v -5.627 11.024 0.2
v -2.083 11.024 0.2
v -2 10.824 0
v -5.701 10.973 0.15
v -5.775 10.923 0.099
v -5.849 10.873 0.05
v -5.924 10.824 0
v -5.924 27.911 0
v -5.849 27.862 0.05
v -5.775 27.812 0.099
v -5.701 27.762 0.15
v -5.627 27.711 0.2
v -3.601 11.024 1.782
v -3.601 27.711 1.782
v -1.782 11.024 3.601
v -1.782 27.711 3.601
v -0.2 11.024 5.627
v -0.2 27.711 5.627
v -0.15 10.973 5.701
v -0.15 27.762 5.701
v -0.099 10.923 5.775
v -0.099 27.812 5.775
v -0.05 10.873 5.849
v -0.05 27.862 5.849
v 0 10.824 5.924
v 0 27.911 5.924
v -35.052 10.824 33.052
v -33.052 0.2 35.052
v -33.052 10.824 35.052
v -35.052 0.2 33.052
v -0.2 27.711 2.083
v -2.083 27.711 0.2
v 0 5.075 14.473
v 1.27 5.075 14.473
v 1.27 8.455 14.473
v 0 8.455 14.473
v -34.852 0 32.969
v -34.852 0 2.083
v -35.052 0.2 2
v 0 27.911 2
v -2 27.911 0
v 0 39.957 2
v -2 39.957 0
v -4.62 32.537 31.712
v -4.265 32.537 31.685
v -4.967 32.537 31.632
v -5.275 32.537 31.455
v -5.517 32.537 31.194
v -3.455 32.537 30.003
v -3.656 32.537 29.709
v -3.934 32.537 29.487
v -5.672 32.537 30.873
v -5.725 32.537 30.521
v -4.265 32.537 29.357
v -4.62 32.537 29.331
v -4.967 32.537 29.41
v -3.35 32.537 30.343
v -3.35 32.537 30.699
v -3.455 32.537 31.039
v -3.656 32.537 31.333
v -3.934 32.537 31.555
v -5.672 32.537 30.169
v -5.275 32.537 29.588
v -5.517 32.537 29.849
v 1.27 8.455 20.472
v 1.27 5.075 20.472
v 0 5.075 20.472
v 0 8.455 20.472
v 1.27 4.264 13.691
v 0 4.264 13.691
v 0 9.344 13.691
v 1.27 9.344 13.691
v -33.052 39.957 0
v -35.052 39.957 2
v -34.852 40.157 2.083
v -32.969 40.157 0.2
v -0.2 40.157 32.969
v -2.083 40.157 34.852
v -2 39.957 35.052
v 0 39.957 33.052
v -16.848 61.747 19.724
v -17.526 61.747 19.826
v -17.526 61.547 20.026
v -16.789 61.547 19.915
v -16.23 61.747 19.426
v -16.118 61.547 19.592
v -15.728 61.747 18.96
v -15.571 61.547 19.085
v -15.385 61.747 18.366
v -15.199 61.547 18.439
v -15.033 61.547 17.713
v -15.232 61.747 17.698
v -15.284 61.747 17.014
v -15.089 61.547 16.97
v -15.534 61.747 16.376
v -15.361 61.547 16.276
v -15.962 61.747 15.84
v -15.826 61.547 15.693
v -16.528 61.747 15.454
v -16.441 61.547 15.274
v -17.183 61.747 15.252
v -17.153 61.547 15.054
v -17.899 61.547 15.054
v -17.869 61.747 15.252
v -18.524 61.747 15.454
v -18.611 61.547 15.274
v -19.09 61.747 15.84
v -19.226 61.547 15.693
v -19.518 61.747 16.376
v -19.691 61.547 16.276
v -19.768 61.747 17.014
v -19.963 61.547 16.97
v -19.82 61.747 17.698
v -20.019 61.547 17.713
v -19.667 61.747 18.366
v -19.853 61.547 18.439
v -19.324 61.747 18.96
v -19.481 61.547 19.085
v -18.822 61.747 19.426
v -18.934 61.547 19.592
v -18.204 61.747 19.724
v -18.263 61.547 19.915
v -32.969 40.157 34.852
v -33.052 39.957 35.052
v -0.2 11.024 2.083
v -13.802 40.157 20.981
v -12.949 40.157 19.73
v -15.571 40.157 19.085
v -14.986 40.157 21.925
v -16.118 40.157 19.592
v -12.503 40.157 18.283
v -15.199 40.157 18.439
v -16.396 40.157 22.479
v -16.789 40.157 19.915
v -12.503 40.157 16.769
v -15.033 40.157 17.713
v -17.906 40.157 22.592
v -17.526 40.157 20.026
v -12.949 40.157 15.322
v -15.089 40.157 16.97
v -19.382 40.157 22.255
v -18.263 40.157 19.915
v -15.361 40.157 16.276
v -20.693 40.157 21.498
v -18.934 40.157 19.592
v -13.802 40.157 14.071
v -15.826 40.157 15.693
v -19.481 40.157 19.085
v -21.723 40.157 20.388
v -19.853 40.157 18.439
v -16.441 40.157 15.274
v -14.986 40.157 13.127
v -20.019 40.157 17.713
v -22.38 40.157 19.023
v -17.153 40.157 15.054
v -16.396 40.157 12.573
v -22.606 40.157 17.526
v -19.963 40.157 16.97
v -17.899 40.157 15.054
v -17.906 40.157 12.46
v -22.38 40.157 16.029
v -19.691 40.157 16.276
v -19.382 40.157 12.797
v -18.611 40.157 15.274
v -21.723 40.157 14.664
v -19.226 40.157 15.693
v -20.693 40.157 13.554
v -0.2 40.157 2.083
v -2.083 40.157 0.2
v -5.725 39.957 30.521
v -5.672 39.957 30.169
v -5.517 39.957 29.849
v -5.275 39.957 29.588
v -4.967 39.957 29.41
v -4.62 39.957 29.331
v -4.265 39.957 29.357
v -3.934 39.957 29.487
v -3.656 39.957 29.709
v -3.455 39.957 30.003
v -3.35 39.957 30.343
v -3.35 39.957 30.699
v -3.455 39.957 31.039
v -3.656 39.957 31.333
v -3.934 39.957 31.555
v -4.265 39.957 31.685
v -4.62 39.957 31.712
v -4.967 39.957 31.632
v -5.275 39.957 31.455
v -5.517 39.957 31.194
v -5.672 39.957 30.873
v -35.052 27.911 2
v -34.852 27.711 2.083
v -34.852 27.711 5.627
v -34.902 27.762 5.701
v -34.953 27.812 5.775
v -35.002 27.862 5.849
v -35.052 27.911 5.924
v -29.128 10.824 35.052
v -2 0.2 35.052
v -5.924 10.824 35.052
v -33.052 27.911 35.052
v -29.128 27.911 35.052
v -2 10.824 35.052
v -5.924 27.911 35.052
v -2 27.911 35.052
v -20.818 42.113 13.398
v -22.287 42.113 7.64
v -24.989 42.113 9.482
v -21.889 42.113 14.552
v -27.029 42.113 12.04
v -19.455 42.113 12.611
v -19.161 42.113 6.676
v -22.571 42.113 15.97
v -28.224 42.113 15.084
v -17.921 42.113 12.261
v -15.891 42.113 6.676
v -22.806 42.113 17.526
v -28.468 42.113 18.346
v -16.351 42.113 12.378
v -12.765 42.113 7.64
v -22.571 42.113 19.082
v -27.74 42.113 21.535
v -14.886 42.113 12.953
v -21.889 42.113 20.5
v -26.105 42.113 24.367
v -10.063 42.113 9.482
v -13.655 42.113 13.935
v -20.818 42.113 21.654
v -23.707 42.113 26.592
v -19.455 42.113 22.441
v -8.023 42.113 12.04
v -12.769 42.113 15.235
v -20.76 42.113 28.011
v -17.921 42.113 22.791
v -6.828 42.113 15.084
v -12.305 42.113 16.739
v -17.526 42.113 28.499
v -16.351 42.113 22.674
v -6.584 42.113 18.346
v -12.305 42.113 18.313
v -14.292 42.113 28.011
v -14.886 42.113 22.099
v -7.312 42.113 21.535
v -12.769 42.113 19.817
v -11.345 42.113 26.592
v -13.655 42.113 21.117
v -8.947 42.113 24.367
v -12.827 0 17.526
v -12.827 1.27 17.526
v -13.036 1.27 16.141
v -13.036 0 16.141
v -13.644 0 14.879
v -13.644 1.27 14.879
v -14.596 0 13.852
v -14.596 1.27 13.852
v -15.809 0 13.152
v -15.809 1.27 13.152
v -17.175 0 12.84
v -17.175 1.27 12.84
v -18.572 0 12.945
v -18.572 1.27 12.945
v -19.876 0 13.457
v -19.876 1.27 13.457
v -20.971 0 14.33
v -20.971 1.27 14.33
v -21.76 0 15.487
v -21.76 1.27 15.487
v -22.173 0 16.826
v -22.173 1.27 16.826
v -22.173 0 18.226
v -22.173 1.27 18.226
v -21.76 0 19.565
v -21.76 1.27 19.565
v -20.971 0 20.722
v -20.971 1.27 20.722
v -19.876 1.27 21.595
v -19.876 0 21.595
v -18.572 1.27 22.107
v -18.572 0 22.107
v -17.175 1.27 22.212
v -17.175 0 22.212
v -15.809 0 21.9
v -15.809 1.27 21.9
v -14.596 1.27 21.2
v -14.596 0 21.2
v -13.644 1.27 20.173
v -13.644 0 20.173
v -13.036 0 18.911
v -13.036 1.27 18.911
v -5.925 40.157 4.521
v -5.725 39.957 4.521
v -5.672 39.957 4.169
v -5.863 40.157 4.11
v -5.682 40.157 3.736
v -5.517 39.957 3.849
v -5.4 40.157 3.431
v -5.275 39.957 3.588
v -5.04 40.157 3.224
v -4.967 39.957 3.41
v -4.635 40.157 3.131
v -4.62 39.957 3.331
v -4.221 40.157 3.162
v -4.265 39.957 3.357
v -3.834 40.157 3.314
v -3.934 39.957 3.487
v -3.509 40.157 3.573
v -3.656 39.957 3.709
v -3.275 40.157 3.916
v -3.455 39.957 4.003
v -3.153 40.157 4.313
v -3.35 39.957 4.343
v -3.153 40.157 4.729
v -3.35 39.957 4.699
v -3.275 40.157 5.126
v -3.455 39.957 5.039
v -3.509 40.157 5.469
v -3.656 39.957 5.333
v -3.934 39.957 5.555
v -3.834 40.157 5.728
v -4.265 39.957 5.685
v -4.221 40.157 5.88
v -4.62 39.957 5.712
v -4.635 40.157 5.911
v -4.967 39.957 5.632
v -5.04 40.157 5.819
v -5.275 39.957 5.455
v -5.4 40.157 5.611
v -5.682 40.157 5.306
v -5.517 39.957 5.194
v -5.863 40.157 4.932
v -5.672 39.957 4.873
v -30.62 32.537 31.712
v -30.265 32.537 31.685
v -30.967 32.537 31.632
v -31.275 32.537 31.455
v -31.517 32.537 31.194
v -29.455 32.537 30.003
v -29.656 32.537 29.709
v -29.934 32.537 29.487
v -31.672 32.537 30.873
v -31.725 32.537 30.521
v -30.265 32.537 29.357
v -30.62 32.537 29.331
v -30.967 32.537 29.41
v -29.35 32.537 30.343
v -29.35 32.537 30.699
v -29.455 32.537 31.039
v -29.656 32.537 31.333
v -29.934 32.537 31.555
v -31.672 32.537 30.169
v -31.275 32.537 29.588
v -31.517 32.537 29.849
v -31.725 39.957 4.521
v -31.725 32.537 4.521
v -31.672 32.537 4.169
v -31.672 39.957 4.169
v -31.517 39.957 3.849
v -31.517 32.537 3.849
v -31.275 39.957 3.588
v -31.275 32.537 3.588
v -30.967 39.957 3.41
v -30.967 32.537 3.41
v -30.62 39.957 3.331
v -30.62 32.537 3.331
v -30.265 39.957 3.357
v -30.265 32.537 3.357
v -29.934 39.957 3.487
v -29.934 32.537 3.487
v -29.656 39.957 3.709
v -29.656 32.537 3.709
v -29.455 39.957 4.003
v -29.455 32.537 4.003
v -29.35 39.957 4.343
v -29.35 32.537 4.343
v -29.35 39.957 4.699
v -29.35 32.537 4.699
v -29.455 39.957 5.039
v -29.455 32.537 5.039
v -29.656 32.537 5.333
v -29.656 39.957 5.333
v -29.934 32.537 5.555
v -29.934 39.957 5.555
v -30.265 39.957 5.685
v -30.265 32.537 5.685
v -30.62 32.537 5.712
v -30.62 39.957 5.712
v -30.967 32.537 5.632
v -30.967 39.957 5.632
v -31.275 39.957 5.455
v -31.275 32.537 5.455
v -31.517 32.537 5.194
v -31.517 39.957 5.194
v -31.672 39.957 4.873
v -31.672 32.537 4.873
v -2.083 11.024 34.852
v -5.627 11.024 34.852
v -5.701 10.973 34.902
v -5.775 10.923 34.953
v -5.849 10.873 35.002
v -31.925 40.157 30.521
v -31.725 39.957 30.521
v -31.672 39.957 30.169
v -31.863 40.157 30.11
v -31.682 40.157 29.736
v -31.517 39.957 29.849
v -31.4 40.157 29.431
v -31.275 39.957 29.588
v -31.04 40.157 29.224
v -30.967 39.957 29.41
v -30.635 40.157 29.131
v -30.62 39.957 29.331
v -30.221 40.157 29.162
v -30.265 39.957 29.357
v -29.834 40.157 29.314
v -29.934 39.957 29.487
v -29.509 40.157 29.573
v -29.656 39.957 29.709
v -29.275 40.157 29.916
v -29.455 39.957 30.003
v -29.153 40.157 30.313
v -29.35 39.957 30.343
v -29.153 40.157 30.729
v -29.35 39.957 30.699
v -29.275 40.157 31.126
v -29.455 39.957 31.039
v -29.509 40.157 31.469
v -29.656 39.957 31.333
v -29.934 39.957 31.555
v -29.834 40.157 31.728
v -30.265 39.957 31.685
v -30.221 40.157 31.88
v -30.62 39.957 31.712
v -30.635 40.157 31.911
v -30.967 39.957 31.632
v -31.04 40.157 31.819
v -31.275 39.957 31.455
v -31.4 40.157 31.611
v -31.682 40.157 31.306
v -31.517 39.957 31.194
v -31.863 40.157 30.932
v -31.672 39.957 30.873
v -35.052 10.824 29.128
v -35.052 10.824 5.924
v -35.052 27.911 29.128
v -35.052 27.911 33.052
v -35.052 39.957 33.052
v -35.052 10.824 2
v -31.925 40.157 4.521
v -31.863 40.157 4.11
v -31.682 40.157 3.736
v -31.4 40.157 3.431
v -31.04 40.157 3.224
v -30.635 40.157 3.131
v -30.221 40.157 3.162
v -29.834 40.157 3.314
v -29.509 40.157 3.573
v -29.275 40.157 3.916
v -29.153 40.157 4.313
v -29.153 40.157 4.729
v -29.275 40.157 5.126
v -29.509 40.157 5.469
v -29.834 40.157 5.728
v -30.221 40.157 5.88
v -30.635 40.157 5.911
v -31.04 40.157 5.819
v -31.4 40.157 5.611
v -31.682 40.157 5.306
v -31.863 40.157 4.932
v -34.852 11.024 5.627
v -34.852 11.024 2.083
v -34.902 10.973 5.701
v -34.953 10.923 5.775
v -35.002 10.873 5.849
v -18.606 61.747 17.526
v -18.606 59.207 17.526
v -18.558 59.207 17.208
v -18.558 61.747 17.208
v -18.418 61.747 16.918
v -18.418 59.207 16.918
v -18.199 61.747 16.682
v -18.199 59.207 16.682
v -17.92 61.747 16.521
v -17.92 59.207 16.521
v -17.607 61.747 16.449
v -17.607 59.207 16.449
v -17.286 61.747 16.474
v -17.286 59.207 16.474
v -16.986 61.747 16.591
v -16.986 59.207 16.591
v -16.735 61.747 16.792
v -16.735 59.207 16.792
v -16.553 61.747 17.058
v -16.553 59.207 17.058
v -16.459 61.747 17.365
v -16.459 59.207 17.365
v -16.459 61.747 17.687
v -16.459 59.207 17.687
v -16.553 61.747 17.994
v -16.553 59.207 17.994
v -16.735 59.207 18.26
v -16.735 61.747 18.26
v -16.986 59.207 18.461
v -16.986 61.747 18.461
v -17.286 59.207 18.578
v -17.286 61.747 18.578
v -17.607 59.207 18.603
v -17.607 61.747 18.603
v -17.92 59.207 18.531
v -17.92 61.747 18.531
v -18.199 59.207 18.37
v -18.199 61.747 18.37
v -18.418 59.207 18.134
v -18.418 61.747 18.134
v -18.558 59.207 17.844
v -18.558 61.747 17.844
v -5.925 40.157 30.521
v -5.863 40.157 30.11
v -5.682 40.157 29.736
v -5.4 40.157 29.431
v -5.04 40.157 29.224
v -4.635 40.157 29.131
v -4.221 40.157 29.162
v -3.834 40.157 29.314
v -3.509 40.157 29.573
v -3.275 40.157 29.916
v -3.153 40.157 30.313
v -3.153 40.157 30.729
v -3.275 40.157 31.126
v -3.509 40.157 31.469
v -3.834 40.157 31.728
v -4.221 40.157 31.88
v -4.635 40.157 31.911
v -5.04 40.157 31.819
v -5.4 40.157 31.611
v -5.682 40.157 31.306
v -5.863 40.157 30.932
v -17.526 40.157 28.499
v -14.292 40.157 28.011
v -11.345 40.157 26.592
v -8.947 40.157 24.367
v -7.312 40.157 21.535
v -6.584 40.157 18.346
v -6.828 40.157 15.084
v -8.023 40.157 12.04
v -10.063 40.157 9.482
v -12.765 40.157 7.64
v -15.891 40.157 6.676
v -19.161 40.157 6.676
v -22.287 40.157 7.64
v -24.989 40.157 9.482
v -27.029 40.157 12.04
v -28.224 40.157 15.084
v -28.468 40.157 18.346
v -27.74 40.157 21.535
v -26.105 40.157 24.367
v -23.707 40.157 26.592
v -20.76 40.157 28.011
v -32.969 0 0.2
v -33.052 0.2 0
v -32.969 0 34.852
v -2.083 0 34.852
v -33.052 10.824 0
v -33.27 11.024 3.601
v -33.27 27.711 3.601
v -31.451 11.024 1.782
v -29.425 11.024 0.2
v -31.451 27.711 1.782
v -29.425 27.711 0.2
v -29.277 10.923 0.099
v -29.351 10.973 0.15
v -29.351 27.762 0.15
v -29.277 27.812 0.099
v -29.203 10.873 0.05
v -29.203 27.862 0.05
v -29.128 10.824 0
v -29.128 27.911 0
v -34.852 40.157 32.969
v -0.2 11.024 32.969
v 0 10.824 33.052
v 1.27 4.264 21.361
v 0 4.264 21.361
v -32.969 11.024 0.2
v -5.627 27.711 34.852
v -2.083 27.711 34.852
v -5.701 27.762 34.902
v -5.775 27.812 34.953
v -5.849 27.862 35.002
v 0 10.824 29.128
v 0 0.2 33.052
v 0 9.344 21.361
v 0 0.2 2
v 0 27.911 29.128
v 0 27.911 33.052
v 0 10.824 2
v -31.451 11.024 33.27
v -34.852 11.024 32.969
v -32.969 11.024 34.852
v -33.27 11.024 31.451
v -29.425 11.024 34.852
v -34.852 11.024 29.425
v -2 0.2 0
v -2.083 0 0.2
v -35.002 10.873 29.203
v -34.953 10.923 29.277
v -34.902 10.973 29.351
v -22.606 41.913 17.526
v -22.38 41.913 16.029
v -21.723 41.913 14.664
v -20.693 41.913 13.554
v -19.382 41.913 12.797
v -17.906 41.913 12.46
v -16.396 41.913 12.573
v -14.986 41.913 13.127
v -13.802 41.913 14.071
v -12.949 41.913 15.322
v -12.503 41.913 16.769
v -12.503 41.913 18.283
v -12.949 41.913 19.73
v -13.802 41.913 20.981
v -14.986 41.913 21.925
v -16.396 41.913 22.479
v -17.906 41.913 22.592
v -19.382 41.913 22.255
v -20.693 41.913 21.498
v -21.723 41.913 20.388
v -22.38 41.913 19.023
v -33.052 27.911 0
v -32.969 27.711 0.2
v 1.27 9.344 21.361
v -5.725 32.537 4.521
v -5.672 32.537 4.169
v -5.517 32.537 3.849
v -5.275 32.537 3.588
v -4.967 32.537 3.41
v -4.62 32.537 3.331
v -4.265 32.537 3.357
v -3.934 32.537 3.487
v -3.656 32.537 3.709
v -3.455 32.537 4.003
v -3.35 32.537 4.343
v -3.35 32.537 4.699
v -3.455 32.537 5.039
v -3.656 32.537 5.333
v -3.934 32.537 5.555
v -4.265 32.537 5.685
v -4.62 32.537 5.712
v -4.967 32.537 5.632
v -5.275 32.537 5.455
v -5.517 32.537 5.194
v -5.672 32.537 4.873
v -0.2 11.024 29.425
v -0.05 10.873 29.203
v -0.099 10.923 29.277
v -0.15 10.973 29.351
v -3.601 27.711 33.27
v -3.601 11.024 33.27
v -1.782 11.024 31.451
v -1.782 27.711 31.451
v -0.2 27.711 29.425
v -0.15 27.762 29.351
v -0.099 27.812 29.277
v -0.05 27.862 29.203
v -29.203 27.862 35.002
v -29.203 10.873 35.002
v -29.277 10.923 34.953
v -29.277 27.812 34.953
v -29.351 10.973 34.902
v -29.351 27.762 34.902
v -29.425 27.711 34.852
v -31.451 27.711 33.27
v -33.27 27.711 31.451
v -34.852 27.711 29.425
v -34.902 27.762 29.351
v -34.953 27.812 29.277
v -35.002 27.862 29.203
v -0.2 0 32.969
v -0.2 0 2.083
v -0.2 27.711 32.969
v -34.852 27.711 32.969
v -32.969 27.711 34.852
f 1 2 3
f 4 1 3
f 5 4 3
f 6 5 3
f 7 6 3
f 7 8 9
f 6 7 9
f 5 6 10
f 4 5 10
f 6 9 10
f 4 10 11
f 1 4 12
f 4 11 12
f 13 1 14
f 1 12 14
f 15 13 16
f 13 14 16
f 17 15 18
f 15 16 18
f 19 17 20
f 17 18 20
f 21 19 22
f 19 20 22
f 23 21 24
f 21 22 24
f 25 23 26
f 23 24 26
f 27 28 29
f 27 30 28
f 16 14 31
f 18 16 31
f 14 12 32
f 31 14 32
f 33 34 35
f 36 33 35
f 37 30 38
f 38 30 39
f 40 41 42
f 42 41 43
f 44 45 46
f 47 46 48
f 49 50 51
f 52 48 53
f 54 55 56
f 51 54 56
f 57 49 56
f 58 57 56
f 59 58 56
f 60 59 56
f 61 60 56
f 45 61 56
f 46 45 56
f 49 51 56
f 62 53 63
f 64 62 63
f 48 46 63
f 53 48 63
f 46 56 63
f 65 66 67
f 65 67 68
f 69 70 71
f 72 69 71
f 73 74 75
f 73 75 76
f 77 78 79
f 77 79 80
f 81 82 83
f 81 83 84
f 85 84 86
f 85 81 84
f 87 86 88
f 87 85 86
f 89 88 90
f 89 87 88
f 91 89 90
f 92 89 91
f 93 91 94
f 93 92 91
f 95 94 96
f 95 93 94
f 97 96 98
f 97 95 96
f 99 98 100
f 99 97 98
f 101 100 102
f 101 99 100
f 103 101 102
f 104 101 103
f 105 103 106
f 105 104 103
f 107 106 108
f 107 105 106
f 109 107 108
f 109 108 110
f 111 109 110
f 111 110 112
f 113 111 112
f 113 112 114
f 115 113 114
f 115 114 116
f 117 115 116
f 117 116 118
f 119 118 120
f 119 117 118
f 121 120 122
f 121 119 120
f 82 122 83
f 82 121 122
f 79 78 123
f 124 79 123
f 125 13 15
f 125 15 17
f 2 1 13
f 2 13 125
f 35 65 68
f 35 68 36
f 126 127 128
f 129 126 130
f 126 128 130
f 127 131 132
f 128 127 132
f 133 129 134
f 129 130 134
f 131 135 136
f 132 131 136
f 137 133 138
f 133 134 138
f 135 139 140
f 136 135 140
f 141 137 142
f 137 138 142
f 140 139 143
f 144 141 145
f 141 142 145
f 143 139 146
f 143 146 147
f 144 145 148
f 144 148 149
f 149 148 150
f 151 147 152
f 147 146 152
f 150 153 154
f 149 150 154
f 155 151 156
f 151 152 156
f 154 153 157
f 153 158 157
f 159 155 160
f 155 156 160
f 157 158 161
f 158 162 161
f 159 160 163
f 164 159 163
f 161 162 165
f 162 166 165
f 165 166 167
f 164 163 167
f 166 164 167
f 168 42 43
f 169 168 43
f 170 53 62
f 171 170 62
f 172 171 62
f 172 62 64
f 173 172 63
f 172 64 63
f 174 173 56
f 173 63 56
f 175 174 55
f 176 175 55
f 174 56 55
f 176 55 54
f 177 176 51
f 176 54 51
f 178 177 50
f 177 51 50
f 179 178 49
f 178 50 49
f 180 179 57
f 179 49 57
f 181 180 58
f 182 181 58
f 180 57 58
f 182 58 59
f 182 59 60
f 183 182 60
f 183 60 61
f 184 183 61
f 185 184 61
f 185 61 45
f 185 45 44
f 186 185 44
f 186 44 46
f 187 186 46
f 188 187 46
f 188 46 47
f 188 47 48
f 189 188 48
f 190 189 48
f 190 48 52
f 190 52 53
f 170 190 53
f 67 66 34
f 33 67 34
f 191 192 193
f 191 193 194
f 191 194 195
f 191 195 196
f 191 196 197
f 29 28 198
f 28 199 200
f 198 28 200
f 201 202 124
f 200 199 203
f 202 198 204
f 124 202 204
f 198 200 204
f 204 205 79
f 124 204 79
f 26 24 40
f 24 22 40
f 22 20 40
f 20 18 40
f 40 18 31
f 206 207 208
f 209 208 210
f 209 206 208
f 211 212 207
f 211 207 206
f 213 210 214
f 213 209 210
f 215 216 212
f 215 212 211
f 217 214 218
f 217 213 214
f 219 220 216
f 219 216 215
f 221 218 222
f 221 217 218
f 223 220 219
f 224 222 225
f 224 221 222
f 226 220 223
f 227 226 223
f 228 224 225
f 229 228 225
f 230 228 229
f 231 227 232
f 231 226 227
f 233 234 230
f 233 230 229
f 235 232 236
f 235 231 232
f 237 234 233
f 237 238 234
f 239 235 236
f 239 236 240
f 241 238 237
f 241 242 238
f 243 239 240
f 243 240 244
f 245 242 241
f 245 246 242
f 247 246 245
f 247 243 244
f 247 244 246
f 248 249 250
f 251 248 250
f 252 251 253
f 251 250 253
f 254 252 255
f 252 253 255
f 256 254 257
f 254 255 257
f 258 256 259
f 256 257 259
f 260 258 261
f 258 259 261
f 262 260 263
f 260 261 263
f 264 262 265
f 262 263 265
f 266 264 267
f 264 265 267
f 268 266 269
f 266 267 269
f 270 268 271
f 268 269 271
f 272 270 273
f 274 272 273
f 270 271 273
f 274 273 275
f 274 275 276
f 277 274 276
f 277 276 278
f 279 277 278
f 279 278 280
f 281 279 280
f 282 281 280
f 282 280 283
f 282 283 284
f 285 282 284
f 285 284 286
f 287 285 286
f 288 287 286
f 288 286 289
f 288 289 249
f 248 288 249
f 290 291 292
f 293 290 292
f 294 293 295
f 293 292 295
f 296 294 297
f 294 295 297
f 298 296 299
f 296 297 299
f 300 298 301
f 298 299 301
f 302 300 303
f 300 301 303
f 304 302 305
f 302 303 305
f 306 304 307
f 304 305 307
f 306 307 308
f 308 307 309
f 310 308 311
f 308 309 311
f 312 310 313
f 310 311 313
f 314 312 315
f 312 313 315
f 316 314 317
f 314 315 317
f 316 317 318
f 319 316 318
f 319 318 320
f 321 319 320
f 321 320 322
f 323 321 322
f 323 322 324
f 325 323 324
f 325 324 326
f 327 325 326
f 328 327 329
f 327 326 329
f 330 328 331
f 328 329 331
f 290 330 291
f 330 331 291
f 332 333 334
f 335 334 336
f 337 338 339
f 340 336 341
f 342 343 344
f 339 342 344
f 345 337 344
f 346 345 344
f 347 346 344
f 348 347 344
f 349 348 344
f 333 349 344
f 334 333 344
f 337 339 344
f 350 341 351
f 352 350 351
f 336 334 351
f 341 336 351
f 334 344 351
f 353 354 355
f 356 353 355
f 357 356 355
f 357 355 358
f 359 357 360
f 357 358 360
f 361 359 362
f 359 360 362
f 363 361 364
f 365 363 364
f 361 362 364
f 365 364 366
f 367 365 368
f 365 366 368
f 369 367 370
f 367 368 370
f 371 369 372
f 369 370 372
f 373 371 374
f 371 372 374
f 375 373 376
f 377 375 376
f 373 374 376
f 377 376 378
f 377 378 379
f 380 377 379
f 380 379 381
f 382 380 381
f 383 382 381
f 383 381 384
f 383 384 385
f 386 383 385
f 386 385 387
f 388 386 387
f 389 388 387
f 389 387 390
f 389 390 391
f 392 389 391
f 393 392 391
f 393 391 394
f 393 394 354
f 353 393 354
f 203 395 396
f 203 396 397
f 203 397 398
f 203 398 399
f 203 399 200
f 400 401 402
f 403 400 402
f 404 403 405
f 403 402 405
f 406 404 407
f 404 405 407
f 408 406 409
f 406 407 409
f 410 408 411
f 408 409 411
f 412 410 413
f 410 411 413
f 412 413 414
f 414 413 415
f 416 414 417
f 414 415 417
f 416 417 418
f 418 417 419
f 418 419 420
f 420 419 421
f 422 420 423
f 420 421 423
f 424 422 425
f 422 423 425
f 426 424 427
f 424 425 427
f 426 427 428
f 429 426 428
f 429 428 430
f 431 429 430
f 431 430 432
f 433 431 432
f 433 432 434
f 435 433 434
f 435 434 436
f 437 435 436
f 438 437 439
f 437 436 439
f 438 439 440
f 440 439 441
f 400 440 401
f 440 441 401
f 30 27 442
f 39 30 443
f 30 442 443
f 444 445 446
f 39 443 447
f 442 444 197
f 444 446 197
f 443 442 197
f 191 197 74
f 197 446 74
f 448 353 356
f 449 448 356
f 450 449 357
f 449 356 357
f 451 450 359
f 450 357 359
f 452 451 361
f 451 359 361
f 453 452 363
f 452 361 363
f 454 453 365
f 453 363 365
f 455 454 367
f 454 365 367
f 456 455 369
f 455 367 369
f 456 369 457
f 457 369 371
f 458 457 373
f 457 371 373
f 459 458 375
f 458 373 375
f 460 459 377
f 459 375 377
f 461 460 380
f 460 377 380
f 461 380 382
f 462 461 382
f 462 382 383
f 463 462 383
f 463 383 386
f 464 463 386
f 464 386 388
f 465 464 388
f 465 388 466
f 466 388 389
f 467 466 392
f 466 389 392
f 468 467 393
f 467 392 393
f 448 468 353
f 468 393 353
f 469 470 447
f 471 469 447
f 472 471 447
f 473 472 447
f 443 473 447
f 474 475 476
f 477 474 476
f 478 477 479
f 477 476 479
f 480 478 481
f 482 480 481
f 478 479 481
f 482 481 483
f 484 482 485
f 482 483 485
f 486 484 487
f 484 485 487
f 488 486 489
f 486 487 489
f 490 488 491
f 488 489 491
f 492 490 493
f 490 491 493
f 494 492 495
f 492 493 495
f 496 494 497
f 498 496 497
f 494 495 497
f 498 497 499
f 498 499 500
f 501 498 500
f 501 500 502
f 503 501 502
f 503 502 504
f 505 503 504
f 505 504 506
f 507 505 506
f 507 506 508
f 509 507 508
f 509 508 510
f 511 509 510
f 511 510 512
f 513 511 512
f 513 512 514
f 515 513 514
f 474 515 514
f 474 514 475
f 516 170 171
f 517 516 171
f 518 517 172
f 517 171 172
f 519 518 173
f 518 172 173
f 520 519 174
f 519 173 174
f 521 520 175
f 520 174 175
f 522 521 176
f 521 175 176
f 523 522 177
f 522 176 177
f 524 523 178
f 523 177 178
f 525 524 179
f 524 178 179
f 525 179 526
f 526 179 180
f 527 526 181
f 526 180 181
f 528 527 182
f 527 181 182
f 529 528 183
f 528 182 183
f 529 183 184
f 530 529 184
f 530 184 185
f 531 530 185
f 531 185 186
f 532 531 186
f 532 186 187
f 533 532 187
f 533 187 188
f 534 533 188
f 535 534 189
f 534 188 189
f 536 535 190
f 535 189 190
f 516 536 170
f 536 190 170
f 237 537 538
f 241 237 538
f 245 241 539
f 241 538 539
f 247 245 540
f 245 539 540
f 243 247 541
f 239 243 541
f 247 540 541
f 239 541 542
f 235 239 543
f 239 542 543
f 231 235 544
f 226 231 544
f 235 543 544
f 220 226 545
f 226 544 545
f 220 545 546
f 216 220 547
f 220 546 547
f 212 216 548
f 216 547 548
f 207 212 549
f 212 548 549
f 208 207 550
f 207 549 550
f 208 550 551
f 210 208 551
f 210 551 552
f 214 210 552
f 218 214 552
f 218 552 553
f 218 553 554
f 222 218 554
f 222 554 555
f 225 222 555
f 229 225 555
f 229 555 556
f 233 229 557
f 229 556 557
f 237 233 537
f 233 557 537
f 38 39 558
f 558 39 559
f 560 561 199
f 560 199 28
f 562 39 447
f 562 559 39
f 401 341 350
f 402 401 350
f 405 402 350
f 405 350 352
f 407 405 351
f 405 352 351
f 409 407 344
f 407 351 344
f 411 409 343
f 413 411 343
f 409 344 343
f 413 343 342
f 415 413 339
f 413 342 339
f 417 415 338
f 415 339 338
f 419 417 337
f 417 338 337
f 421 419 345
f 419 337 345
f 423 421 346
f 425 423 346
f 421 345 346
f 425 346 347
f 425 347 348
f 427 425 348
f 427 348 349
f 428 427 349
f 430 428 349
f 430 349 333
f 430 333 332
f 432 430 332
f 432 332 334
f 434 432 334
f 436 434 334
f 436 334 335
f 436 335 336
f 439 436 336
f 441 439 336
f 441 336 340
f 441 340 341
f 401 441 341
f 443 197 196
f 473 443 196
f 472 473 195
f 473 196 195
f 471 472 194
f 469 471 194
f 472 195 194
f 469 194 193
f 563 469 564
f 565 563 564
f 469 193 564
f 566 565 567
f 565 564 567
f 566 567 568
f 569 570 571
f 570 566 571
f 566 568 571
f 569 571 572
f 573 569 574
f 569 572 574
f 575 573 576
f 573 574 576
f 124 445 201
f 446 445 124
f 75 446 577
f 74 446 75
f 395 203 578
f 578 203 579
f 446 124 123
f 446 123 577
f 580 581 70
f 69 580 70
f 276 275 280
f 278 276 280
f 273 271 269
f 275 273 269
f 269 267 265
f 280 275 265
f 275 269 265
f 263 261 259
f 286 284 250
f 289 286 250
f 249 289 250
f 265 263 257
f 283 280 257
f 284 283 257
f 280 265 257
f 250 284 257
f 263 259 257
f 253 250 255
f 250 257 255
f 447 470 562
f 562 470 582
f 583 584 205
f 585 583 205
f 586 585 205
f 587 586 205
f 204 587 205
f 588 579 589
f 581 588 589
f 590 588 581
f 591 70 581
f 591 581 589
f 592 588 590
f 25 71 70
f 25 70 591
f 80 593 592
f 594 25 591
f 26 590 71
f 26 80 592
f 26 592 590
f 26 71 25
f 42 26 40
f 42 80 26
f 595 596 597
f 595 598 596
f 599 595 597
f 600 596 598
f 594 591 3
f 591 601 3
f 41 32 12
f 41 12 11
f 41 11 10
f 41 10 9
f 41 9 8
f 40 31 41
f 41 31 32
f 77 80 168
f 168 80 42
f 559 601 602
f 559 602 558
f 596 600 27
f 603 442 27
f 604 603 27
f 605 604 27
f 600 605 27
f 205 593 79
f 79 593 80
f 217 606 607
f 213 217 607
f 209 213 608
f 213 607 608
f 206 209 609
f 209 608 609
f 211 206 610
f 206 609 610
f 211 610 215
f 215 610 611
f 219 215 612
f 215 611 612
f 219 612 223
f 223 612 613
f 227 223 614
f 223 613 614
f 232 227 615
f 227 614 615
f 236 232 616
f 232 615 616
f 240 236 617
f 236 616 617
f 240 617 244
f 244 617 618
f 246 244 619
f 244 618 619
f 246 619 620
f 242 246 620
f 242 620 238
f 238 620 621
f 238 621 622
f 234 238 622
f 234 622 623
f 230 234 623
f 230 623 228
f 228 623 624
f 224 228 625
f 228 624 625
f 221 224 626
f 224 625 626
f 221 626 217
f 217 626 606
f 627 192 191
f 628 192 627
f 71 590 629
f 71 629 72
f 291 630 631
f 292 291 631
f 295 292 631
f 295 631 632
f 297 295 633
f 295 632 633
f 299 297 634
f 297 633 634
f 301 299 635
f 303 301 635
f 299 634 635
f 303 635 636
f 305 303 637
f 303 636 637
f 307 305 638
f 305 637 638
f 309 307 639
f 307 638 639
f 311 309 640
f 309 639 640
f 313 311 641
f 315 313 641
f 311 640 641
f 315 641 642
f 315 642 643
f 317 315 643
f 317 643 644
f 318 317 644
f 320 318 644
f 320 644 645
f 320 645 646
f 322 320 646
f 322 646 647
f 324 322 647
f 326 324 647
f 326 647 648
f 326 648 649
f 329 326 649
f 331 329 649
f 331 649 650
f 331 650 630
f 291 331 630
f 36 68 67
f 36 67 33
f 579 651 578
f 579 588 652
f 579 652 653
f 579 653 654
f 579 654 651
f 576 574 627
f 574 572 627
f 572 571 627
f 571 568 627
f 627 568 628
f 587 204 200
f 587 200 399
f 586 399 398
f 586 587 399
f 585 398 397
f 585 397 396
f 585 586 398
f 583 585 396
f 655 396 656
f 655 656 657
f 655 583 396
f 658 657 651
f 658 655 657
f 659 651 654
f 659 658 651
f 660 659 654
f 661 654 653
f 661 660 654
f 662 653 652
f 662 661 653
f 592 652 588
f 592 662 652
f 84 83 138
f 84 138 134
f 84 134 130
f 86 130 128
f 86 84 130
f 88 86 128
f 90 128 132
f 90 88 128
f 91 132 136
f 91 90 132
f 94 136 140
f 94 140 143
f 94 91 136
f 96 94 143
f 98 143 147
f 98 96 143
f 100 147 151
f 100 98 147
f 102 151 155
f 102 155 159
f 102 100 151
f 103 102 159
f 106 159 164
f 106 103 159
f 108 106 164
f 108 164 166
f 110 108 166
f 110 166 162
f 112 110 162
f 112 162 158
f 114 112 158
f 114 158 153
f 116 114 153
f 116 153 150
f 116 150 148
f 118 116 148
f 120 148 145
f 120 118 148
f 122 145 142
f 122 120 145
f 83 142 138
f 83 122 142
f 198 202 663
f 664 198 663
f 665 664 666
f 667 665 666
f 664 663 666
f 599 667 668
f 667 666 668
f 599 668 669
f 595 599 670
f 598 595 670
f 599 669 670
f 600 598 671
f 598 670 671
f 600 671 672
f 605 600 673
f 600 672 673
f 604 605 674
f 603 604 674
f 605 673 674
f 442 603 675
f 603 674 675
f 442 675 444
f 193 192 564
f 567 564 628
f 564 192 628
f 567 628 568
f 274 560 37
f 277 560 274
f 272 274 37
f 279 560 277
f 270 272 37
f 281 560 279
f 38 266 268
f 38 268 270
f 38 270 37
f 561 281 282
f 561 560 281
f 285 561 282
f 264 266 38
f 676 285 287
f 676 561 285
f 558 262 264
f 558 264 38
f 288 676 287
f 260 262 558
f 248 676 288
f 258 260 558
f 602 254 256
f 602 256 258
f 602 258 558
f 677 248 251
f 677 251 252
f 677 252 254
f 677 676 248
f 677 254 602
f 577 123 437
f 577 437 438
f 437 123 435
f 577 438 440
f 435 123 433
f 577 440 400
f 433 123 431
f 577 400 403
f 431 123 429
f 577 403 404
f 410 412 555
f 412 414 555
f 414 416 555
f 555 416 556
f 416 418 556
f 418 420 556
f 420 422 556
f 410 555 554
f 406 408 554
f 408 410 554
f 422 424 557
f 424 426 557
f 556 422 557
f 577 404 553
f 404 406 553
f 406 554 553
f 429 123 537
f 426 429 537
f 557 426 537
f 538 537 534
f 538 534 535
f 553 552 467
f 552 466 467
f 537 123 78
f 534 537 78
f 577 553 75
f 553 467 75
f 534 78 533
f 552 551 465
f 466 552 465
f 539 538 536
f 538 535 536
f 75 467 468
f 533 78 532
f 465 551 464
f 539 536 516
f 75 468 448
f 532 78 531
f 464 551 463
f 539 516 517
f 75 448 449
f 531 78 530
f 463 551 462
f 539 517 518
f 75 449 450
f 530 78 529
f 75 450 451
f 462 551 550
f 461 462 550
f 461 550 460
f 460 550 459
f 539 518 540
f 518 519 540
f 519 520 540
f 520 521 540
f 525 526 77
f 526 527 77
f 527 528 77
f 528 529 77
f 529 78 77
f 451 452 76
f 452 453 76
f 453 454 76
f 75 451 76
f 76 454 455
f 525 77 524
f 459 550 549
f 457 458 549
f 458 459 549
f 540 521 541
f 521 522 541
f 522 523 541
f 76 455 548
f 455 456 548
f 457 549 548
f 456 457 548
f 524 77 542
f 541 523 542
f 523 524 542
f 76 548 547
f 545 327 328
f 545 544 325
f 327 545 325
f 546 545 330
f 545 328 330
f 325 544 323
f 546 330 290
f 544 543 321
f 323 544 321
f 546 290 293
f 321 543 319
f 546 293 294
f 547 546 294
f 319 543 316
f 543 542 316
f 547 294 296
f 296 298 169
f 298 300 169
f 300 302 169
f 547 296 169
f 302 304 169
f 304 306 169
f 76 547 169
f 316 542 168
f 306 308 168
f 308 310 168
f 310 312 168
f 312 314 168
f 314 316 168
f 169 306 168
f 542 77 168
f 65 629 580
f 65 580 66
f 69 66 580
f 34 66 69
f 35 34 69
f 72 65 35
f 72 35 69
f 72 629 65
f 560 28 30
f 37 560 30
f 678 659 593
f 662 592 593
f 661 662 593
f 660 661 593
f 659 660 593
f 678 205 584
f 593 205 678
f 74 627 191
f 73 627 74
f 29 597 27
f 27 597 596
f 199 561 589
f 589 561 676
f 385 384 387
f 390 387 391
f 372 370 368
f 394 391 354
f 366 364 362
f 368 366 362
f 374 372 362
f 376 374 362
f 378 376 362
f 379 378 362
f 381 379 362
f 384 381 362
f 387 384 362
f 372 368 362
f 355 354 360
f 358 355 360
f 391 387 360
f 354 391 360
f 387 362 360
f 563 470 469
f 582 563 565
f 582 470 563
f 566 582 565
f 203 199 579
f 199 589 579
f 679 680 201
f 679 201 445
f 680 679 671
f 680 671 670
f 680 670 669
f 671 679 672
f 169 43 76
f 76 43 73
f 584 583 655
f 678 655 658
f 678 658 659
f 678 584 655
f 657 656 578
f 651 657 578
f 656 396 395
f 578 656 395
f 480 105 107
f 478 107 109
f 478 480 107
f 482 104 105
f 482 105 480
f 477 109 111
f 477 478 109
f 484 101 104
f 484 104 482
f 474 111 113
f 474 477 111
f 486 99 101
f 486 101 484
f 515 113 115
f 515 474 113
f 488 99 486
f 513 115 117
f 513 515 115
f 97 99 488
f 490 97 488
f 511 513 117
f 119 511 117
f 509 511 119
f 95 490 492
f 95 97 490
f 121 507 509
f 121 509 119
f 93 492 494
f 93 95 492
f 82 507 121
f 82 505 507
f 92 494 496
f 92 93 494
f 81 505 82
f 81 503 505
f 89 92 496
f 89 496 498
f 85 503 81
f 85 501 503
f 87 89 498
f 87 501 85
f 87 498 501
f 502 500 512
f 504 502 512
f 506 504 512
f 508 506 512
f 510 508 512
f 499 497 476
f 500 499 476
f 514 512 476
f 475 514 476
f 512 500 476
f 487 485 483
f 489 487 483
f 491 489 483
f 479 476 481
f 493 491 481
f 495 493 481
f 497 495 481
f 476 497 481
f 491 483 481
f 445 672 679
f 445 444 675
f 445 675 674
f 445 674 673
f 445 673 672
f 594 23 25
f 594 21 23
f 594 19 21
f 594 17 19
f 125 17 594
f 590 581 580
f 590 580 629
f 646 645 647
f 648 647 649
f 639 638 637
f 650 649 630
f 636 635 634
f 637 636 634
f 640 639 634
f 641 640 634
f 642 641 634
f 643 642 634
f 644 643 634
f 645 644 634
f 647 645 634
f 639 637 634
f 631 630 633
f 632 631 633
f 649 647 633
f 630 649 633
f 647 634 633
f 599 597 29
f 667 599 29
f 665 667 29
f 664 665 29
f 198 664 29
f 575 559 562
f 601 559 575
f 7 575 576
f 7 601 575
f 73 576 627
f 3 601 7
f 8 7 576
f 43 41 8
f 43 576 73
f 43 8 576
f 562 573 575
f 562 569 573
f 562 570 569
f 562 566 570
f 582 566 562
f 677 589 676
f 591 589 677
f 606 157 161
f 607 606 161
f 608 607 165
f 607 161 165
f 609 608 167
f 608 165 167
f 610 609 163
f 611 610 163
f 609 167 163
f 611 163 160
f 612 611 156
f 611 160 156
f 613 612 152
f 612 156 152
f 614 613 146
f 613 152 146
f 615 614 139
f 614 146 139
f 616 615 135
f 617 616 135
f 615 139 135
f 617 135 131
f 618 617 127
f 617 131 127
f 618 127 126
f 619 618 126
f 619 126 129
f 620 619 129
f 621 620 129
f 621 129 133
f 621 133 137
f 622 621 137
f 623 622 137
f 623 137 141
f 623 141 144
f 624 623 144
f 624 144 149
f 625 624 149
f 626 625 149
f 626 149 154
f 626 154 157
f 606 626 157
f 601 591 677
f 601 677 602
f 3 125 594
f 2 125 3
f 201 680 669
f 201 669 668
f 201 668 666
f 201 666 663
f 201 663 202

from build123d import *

# Parameters (mm, degrees)
SKETCH1_W                = 35.052
SKETCH1_H                = 40.1574
BOSS_EXTRUDE1_DEPTH      = 35.052
CUT_EXTRUDE1_DEPTH       = 16.6878
CUT_EXTRUDE2_DEPTH       = 16.6878
CUT_EXTRUDE3_DEPTH       = 16.6878
CUT_EXTRUDE4_START       = -16.6878
CUT_EXTRUDE4_DEPTH       = 16.6878
SKETCH6_W                = 7.6708
SKETCH6_H                = 5.08
BOSS_EXTRUDE2_DEPTH      = 1.27
SKETCH7_W                = 5.999755797
SKETCH7_H                = 3.380210023
CUT_EXTRUDE5_DEPTH       = 1.27
SKETCH8_R                = 10.9728
BOSS_EXTRUDE3_DEPTH      = 1.9558
HOLE1_D                  = 10.16
HOLE1_DEPTH              = 1.9558
SKETCH11_W               = 2.5
SKETCH11_H               = 21.59
M8_CLEARANCE_HOLE1_D     = 9.398
M8_CLEARANCE_HOLE1_DEPTH = 1.27
M2_CLEARANCE_HOLE1_D     = 2.3876
M2_CLEARANCE_HOLE1_DEPTH = 7.62
HOLE2_D                  = 2.159089633
HOLE2_DEPTH              = 2.54
CHAMFER1_SIZE            = 2
CHAMFER2_SIZE            = 0.2


with BuildPart() as part:
    # Sketch1 → Boss-Extrude1 (new body)
    with BuildSketch(Plane(origin=(0, 0, 0), x_dir=(0, 0, -1), z_dir=(1, 0, 0))):
        with Locations((-17.526, 20.0787)):
            Rectangle(SKETCH1_W, SKETCH1_H)
    extrude(amount=-BOSS_EXTRUDE1_DEPTH)

    # Sketch2 → Cut-Extrude1 (cut)
    with BuildSketch(Plane(origin=(0, 27.7114, 0), x_dir=(1, 0, 0), z_dir=(0, 1, 0))):
        with BuildLine():
            Line((0, -5.923557746), (0, 0))
            Line((0, 0), (-5.923557746, 0))
            ThreePointArc((-5.923557746, 0), (-2.66367612, -2.66367612), (0, -5.923557746))
        make_face()
    extrude(amount=-CUT_EXTRUDE1_DEPTH, mode=Mode.SUBTRACT)

    # Sketch3 → Cut-Extrude2 (cut)
    with BuildSketch(Plane(origin=(0, 27.7114, 0), x_dir=(1, 0, 0), z_dir=(0, 1, 0))):
        with BuildLine():
            Line((-29.128442254, 0), (-35.052, 0))
            Line((-35.052, 0), (-35.052, -5.923557746))
            ThreePointArc((-35.052, -5.923557746), (-32.38832388, -2.66367612), (-29.128442254, 0))
        make_face()
    extrude(amount=-CUT_EXTRUDE2_DEPTH, mode=Mode.SUBTRACT)

    # Sketch4 → Cut-Extrude3 (cut)
    with BuildSketch(Plane(origin=(0, 27.7114, 0), x_dir=(1, 0, 0), z_dir=(0, 1, 0))):
        with BuildLine():
            Line((-35.052, -29.128442254), (-35.052, -35.052))
            Line((-35.052, -35.052), (-29.128442254, -35.052))
            ThreePointArc((-29.128442254, -35.052), (-32.38832388, -32.38832388), (-35.052, -29.128442254))
        make_face()
    extrude(amount=-CUT_EXTRUDE3_DEPTH, mode=Mode.SUBTRACT)

    # Sketch5 → Cut-Extrude4 (cut)
    with BuildSketch(Plane.XZ.offset(-11.0236).offset(CUT_EXTRUDE4_START)):
        with BuildLine():
            Line((0, 29.128442254), (0, 35.052))
            Line((0, 35.052), (-5.923557746, 35.052))
            ThreePointArc((-5.923557746, 35.052), (-2.66367612, 32.38832388), (0, 29.128442254))
        make_face()
    extrude(amount=CUT_EXTRUDE4_DEPTH, mode=Mode.SUBTRACT)

    # Sketch6 → Boss-Extrude2 (add)
    with BuildSketch(Plane(origin=(0, 0, 0), x_dir=(0, 0, -1), z_dir=(1, 0, 0))):
        with Locations((-17.526, 6.804)):
            Rectangle(SKETCH6_W, SKETCH6_H)
    extrude(amount=BOSS_EXTRUDE2_DEPTH)

    # Sketch7 → Cut-Extrude5 (cut)
    with BuildSketch(Plane(origin=(1.27, 0, 0), x_dir=(0, 0, -1), z_dir=(1, 0, 0))):
        with Locations((-17.472522102, 6.764894989)):
            Rectangle(SKETCH7_W, SKETCH7_H)
    extrude(amount=-CUT_EXTRUDE5_DEPTH, mode=Mode.SUBTRACT)

    # Sketch8 → Boss-Extrude3 (add)
    with BuildSketch(Plane(origin=(0, 40.1574, 0), x_dir=(-1, 0, 0), z_dir=(0, 1, 0))):
        with Locations(Location((17.526, 17.526, 0), (0, 0, 90))):
            Circle(SKETCH8_R)
    extrude(amount=BOSS_EXTRUDE3_DEPTH)

    # Hole1
    with Locations(Plane(origin=(0, 42.1132, 0), x_dir=(1, 0, 0), z_dir=(0, 1, 0))):
        with Locations((-17.526, -17.526)):
            Hole(HOLE1_D / 2, depth=HOLE1_DEPTH)

    # Sketch11 → Revolve1 (revolve)
    with BuildSketch(Plane(origin=(0, 0, 17.526), x_dir=(-1, 0, 0), z_dir=(0, 0, -1)), mode=Mode.PRIVATE) as revolve1_sk:
        with Locations((16.276, 50.9524)):
            Rectangle(SKETCH11_W, SKETCH11_H)
    revolve(revolve1_sk.sketch.rotate(Axis((-17.526, 40.1574, 17.526), (0, 1, 0)), 270), axis=Axis((-17.526, 40.1574, 17.526), (0, 1, 0)))

    # M8 Clearance Hole1
    with Locations(Plane(origin=(0, 0, 0), x_dir=(-1, 0, 0), z_dir=(0, -1, 0))):
        with Locations((17.526, -17.526)):
            Hole(M8_CLEARANCE_HOLE1_D / 2, depth=M8_CLEARANCE_HOLE1_DEPTH)

    # M2 Clearance Hole1
    with Locations(Plane(origin=(0, 40.1574, 0), x_dir=(1, 0, 0), z_dir=(0, 1, 0))):
        with Locations((-4.5308, -30.5212), (-30.5308, -4.5212), (-30.5308, -30.5212), (-4.5308, -4.5212)):
            Hole(M2_CLEARANCE_HOLE1_D / 2, depth=M2_CLEARANCE_HOLE1_DEPTH)

    # Hole2
    with Locations(Plane(origin=(0, 61.7474, 0), x_dir=(1, 0, 0), z_dir=(0, 1, 0))):
        with Locations((-17.526, -17.526)):
            Hole(HOLE2_D / 2, depth=HOLE2_DEPTH)

    # Chamfer1
    chamfer1_edges = [part.edges().sort_by_distance(p)[0] for p in [
        (-35.052, 5.5118, 0),
        (0, 33.9344, 0),
        (-35.052, 33.9344, 0),
        (-35.052, 5.5118, 35.052),
        (-35.052, 33.9344, 35.052),
        (0, 5.5118, 35.052),
        (0, 5.5118, 0),
        (0, 33.9344, 35.052),
    ]]
    chamfer(chamfer1_edges, length=CHAMFER1_SIZE)

    # Chamfer2
    chamfer2_edges = [part.edges().sort_by_distance(p)[0] for p in [
        (-3.337, 40.1574, 4.5212),
        (-29.337, 40.1574, 30.5212),
        (-29.337, 40.1574, 4.5212),
        (-3.337, 40.1574, 30.5212),
        (-3.961778873, 27.7114, 35.052),
        (-17.526, 40.1574, 35.052),
        (-31.090221127, 27.7114, 35.052),
        (-31.090221127, 11.0236, 35.052),
        (-17.526, 0, 35.052),
        (-3.961778873, 11.0236, 35.052),
        (-34.052, 27.7114, 34.052),
        (-35.052, 40.1574, 17.526),
        (-35.052, 27.7114, 3.961778873),
        (-35.052, 11.0236, 3.961778873),
        (-35.052, 0, 17.526),
        (0, 40.1574, 17.526),
        (-17.526, 40.1574, 0),
        (-1, 40.1574, 34.052),
        (-34.052, 40.1574, 1),
        (-1, 40.1574, 1),
        (-34.052, 40.1574, 34.052),
        (0, 0, 17.526),
        (-17.526, 0, 0),
        (-34.052, 0, 34.052),
        (-1, 0, 1),
        (-34.052, 0, 1),
        (-1, 0, 34.052),
        (-1, 11.0236, 34.052),
        (-3.961778873, 27.7114, 0),
        (-3.961778873, 11.0236, 0),
        (-34.052, 11.0236, 1),
        (-1, 27.7114, 1),
        (-1, 11.0236, 1),
        (-34.052, 27.7114, 1),
        (-1, 27.7114, 34.052),
        (-34.052, 11.0236, 34.052),
        (0, 11.0236, 3.961778873),
        (0, 27.7114, 3.961778873),
        (-31.090221127, 11.0236, 0),
        (-31.090221127, 27.7114, 0),
        (-35.052, 11.0236, 31.090221127),
        (-35.052, 27.7114, 31.090221127),
        (0, 27.7114, 31.090221127),
        (0, 11.0236, 31.090221127),
        (-12.446, 42.1132, 17.526),
        (-17.526, 61.7474, 15.026),
    ]]
    chamfer(chamfer2_edges, length=CHAMFER2_SIZE)


solid = part.part
